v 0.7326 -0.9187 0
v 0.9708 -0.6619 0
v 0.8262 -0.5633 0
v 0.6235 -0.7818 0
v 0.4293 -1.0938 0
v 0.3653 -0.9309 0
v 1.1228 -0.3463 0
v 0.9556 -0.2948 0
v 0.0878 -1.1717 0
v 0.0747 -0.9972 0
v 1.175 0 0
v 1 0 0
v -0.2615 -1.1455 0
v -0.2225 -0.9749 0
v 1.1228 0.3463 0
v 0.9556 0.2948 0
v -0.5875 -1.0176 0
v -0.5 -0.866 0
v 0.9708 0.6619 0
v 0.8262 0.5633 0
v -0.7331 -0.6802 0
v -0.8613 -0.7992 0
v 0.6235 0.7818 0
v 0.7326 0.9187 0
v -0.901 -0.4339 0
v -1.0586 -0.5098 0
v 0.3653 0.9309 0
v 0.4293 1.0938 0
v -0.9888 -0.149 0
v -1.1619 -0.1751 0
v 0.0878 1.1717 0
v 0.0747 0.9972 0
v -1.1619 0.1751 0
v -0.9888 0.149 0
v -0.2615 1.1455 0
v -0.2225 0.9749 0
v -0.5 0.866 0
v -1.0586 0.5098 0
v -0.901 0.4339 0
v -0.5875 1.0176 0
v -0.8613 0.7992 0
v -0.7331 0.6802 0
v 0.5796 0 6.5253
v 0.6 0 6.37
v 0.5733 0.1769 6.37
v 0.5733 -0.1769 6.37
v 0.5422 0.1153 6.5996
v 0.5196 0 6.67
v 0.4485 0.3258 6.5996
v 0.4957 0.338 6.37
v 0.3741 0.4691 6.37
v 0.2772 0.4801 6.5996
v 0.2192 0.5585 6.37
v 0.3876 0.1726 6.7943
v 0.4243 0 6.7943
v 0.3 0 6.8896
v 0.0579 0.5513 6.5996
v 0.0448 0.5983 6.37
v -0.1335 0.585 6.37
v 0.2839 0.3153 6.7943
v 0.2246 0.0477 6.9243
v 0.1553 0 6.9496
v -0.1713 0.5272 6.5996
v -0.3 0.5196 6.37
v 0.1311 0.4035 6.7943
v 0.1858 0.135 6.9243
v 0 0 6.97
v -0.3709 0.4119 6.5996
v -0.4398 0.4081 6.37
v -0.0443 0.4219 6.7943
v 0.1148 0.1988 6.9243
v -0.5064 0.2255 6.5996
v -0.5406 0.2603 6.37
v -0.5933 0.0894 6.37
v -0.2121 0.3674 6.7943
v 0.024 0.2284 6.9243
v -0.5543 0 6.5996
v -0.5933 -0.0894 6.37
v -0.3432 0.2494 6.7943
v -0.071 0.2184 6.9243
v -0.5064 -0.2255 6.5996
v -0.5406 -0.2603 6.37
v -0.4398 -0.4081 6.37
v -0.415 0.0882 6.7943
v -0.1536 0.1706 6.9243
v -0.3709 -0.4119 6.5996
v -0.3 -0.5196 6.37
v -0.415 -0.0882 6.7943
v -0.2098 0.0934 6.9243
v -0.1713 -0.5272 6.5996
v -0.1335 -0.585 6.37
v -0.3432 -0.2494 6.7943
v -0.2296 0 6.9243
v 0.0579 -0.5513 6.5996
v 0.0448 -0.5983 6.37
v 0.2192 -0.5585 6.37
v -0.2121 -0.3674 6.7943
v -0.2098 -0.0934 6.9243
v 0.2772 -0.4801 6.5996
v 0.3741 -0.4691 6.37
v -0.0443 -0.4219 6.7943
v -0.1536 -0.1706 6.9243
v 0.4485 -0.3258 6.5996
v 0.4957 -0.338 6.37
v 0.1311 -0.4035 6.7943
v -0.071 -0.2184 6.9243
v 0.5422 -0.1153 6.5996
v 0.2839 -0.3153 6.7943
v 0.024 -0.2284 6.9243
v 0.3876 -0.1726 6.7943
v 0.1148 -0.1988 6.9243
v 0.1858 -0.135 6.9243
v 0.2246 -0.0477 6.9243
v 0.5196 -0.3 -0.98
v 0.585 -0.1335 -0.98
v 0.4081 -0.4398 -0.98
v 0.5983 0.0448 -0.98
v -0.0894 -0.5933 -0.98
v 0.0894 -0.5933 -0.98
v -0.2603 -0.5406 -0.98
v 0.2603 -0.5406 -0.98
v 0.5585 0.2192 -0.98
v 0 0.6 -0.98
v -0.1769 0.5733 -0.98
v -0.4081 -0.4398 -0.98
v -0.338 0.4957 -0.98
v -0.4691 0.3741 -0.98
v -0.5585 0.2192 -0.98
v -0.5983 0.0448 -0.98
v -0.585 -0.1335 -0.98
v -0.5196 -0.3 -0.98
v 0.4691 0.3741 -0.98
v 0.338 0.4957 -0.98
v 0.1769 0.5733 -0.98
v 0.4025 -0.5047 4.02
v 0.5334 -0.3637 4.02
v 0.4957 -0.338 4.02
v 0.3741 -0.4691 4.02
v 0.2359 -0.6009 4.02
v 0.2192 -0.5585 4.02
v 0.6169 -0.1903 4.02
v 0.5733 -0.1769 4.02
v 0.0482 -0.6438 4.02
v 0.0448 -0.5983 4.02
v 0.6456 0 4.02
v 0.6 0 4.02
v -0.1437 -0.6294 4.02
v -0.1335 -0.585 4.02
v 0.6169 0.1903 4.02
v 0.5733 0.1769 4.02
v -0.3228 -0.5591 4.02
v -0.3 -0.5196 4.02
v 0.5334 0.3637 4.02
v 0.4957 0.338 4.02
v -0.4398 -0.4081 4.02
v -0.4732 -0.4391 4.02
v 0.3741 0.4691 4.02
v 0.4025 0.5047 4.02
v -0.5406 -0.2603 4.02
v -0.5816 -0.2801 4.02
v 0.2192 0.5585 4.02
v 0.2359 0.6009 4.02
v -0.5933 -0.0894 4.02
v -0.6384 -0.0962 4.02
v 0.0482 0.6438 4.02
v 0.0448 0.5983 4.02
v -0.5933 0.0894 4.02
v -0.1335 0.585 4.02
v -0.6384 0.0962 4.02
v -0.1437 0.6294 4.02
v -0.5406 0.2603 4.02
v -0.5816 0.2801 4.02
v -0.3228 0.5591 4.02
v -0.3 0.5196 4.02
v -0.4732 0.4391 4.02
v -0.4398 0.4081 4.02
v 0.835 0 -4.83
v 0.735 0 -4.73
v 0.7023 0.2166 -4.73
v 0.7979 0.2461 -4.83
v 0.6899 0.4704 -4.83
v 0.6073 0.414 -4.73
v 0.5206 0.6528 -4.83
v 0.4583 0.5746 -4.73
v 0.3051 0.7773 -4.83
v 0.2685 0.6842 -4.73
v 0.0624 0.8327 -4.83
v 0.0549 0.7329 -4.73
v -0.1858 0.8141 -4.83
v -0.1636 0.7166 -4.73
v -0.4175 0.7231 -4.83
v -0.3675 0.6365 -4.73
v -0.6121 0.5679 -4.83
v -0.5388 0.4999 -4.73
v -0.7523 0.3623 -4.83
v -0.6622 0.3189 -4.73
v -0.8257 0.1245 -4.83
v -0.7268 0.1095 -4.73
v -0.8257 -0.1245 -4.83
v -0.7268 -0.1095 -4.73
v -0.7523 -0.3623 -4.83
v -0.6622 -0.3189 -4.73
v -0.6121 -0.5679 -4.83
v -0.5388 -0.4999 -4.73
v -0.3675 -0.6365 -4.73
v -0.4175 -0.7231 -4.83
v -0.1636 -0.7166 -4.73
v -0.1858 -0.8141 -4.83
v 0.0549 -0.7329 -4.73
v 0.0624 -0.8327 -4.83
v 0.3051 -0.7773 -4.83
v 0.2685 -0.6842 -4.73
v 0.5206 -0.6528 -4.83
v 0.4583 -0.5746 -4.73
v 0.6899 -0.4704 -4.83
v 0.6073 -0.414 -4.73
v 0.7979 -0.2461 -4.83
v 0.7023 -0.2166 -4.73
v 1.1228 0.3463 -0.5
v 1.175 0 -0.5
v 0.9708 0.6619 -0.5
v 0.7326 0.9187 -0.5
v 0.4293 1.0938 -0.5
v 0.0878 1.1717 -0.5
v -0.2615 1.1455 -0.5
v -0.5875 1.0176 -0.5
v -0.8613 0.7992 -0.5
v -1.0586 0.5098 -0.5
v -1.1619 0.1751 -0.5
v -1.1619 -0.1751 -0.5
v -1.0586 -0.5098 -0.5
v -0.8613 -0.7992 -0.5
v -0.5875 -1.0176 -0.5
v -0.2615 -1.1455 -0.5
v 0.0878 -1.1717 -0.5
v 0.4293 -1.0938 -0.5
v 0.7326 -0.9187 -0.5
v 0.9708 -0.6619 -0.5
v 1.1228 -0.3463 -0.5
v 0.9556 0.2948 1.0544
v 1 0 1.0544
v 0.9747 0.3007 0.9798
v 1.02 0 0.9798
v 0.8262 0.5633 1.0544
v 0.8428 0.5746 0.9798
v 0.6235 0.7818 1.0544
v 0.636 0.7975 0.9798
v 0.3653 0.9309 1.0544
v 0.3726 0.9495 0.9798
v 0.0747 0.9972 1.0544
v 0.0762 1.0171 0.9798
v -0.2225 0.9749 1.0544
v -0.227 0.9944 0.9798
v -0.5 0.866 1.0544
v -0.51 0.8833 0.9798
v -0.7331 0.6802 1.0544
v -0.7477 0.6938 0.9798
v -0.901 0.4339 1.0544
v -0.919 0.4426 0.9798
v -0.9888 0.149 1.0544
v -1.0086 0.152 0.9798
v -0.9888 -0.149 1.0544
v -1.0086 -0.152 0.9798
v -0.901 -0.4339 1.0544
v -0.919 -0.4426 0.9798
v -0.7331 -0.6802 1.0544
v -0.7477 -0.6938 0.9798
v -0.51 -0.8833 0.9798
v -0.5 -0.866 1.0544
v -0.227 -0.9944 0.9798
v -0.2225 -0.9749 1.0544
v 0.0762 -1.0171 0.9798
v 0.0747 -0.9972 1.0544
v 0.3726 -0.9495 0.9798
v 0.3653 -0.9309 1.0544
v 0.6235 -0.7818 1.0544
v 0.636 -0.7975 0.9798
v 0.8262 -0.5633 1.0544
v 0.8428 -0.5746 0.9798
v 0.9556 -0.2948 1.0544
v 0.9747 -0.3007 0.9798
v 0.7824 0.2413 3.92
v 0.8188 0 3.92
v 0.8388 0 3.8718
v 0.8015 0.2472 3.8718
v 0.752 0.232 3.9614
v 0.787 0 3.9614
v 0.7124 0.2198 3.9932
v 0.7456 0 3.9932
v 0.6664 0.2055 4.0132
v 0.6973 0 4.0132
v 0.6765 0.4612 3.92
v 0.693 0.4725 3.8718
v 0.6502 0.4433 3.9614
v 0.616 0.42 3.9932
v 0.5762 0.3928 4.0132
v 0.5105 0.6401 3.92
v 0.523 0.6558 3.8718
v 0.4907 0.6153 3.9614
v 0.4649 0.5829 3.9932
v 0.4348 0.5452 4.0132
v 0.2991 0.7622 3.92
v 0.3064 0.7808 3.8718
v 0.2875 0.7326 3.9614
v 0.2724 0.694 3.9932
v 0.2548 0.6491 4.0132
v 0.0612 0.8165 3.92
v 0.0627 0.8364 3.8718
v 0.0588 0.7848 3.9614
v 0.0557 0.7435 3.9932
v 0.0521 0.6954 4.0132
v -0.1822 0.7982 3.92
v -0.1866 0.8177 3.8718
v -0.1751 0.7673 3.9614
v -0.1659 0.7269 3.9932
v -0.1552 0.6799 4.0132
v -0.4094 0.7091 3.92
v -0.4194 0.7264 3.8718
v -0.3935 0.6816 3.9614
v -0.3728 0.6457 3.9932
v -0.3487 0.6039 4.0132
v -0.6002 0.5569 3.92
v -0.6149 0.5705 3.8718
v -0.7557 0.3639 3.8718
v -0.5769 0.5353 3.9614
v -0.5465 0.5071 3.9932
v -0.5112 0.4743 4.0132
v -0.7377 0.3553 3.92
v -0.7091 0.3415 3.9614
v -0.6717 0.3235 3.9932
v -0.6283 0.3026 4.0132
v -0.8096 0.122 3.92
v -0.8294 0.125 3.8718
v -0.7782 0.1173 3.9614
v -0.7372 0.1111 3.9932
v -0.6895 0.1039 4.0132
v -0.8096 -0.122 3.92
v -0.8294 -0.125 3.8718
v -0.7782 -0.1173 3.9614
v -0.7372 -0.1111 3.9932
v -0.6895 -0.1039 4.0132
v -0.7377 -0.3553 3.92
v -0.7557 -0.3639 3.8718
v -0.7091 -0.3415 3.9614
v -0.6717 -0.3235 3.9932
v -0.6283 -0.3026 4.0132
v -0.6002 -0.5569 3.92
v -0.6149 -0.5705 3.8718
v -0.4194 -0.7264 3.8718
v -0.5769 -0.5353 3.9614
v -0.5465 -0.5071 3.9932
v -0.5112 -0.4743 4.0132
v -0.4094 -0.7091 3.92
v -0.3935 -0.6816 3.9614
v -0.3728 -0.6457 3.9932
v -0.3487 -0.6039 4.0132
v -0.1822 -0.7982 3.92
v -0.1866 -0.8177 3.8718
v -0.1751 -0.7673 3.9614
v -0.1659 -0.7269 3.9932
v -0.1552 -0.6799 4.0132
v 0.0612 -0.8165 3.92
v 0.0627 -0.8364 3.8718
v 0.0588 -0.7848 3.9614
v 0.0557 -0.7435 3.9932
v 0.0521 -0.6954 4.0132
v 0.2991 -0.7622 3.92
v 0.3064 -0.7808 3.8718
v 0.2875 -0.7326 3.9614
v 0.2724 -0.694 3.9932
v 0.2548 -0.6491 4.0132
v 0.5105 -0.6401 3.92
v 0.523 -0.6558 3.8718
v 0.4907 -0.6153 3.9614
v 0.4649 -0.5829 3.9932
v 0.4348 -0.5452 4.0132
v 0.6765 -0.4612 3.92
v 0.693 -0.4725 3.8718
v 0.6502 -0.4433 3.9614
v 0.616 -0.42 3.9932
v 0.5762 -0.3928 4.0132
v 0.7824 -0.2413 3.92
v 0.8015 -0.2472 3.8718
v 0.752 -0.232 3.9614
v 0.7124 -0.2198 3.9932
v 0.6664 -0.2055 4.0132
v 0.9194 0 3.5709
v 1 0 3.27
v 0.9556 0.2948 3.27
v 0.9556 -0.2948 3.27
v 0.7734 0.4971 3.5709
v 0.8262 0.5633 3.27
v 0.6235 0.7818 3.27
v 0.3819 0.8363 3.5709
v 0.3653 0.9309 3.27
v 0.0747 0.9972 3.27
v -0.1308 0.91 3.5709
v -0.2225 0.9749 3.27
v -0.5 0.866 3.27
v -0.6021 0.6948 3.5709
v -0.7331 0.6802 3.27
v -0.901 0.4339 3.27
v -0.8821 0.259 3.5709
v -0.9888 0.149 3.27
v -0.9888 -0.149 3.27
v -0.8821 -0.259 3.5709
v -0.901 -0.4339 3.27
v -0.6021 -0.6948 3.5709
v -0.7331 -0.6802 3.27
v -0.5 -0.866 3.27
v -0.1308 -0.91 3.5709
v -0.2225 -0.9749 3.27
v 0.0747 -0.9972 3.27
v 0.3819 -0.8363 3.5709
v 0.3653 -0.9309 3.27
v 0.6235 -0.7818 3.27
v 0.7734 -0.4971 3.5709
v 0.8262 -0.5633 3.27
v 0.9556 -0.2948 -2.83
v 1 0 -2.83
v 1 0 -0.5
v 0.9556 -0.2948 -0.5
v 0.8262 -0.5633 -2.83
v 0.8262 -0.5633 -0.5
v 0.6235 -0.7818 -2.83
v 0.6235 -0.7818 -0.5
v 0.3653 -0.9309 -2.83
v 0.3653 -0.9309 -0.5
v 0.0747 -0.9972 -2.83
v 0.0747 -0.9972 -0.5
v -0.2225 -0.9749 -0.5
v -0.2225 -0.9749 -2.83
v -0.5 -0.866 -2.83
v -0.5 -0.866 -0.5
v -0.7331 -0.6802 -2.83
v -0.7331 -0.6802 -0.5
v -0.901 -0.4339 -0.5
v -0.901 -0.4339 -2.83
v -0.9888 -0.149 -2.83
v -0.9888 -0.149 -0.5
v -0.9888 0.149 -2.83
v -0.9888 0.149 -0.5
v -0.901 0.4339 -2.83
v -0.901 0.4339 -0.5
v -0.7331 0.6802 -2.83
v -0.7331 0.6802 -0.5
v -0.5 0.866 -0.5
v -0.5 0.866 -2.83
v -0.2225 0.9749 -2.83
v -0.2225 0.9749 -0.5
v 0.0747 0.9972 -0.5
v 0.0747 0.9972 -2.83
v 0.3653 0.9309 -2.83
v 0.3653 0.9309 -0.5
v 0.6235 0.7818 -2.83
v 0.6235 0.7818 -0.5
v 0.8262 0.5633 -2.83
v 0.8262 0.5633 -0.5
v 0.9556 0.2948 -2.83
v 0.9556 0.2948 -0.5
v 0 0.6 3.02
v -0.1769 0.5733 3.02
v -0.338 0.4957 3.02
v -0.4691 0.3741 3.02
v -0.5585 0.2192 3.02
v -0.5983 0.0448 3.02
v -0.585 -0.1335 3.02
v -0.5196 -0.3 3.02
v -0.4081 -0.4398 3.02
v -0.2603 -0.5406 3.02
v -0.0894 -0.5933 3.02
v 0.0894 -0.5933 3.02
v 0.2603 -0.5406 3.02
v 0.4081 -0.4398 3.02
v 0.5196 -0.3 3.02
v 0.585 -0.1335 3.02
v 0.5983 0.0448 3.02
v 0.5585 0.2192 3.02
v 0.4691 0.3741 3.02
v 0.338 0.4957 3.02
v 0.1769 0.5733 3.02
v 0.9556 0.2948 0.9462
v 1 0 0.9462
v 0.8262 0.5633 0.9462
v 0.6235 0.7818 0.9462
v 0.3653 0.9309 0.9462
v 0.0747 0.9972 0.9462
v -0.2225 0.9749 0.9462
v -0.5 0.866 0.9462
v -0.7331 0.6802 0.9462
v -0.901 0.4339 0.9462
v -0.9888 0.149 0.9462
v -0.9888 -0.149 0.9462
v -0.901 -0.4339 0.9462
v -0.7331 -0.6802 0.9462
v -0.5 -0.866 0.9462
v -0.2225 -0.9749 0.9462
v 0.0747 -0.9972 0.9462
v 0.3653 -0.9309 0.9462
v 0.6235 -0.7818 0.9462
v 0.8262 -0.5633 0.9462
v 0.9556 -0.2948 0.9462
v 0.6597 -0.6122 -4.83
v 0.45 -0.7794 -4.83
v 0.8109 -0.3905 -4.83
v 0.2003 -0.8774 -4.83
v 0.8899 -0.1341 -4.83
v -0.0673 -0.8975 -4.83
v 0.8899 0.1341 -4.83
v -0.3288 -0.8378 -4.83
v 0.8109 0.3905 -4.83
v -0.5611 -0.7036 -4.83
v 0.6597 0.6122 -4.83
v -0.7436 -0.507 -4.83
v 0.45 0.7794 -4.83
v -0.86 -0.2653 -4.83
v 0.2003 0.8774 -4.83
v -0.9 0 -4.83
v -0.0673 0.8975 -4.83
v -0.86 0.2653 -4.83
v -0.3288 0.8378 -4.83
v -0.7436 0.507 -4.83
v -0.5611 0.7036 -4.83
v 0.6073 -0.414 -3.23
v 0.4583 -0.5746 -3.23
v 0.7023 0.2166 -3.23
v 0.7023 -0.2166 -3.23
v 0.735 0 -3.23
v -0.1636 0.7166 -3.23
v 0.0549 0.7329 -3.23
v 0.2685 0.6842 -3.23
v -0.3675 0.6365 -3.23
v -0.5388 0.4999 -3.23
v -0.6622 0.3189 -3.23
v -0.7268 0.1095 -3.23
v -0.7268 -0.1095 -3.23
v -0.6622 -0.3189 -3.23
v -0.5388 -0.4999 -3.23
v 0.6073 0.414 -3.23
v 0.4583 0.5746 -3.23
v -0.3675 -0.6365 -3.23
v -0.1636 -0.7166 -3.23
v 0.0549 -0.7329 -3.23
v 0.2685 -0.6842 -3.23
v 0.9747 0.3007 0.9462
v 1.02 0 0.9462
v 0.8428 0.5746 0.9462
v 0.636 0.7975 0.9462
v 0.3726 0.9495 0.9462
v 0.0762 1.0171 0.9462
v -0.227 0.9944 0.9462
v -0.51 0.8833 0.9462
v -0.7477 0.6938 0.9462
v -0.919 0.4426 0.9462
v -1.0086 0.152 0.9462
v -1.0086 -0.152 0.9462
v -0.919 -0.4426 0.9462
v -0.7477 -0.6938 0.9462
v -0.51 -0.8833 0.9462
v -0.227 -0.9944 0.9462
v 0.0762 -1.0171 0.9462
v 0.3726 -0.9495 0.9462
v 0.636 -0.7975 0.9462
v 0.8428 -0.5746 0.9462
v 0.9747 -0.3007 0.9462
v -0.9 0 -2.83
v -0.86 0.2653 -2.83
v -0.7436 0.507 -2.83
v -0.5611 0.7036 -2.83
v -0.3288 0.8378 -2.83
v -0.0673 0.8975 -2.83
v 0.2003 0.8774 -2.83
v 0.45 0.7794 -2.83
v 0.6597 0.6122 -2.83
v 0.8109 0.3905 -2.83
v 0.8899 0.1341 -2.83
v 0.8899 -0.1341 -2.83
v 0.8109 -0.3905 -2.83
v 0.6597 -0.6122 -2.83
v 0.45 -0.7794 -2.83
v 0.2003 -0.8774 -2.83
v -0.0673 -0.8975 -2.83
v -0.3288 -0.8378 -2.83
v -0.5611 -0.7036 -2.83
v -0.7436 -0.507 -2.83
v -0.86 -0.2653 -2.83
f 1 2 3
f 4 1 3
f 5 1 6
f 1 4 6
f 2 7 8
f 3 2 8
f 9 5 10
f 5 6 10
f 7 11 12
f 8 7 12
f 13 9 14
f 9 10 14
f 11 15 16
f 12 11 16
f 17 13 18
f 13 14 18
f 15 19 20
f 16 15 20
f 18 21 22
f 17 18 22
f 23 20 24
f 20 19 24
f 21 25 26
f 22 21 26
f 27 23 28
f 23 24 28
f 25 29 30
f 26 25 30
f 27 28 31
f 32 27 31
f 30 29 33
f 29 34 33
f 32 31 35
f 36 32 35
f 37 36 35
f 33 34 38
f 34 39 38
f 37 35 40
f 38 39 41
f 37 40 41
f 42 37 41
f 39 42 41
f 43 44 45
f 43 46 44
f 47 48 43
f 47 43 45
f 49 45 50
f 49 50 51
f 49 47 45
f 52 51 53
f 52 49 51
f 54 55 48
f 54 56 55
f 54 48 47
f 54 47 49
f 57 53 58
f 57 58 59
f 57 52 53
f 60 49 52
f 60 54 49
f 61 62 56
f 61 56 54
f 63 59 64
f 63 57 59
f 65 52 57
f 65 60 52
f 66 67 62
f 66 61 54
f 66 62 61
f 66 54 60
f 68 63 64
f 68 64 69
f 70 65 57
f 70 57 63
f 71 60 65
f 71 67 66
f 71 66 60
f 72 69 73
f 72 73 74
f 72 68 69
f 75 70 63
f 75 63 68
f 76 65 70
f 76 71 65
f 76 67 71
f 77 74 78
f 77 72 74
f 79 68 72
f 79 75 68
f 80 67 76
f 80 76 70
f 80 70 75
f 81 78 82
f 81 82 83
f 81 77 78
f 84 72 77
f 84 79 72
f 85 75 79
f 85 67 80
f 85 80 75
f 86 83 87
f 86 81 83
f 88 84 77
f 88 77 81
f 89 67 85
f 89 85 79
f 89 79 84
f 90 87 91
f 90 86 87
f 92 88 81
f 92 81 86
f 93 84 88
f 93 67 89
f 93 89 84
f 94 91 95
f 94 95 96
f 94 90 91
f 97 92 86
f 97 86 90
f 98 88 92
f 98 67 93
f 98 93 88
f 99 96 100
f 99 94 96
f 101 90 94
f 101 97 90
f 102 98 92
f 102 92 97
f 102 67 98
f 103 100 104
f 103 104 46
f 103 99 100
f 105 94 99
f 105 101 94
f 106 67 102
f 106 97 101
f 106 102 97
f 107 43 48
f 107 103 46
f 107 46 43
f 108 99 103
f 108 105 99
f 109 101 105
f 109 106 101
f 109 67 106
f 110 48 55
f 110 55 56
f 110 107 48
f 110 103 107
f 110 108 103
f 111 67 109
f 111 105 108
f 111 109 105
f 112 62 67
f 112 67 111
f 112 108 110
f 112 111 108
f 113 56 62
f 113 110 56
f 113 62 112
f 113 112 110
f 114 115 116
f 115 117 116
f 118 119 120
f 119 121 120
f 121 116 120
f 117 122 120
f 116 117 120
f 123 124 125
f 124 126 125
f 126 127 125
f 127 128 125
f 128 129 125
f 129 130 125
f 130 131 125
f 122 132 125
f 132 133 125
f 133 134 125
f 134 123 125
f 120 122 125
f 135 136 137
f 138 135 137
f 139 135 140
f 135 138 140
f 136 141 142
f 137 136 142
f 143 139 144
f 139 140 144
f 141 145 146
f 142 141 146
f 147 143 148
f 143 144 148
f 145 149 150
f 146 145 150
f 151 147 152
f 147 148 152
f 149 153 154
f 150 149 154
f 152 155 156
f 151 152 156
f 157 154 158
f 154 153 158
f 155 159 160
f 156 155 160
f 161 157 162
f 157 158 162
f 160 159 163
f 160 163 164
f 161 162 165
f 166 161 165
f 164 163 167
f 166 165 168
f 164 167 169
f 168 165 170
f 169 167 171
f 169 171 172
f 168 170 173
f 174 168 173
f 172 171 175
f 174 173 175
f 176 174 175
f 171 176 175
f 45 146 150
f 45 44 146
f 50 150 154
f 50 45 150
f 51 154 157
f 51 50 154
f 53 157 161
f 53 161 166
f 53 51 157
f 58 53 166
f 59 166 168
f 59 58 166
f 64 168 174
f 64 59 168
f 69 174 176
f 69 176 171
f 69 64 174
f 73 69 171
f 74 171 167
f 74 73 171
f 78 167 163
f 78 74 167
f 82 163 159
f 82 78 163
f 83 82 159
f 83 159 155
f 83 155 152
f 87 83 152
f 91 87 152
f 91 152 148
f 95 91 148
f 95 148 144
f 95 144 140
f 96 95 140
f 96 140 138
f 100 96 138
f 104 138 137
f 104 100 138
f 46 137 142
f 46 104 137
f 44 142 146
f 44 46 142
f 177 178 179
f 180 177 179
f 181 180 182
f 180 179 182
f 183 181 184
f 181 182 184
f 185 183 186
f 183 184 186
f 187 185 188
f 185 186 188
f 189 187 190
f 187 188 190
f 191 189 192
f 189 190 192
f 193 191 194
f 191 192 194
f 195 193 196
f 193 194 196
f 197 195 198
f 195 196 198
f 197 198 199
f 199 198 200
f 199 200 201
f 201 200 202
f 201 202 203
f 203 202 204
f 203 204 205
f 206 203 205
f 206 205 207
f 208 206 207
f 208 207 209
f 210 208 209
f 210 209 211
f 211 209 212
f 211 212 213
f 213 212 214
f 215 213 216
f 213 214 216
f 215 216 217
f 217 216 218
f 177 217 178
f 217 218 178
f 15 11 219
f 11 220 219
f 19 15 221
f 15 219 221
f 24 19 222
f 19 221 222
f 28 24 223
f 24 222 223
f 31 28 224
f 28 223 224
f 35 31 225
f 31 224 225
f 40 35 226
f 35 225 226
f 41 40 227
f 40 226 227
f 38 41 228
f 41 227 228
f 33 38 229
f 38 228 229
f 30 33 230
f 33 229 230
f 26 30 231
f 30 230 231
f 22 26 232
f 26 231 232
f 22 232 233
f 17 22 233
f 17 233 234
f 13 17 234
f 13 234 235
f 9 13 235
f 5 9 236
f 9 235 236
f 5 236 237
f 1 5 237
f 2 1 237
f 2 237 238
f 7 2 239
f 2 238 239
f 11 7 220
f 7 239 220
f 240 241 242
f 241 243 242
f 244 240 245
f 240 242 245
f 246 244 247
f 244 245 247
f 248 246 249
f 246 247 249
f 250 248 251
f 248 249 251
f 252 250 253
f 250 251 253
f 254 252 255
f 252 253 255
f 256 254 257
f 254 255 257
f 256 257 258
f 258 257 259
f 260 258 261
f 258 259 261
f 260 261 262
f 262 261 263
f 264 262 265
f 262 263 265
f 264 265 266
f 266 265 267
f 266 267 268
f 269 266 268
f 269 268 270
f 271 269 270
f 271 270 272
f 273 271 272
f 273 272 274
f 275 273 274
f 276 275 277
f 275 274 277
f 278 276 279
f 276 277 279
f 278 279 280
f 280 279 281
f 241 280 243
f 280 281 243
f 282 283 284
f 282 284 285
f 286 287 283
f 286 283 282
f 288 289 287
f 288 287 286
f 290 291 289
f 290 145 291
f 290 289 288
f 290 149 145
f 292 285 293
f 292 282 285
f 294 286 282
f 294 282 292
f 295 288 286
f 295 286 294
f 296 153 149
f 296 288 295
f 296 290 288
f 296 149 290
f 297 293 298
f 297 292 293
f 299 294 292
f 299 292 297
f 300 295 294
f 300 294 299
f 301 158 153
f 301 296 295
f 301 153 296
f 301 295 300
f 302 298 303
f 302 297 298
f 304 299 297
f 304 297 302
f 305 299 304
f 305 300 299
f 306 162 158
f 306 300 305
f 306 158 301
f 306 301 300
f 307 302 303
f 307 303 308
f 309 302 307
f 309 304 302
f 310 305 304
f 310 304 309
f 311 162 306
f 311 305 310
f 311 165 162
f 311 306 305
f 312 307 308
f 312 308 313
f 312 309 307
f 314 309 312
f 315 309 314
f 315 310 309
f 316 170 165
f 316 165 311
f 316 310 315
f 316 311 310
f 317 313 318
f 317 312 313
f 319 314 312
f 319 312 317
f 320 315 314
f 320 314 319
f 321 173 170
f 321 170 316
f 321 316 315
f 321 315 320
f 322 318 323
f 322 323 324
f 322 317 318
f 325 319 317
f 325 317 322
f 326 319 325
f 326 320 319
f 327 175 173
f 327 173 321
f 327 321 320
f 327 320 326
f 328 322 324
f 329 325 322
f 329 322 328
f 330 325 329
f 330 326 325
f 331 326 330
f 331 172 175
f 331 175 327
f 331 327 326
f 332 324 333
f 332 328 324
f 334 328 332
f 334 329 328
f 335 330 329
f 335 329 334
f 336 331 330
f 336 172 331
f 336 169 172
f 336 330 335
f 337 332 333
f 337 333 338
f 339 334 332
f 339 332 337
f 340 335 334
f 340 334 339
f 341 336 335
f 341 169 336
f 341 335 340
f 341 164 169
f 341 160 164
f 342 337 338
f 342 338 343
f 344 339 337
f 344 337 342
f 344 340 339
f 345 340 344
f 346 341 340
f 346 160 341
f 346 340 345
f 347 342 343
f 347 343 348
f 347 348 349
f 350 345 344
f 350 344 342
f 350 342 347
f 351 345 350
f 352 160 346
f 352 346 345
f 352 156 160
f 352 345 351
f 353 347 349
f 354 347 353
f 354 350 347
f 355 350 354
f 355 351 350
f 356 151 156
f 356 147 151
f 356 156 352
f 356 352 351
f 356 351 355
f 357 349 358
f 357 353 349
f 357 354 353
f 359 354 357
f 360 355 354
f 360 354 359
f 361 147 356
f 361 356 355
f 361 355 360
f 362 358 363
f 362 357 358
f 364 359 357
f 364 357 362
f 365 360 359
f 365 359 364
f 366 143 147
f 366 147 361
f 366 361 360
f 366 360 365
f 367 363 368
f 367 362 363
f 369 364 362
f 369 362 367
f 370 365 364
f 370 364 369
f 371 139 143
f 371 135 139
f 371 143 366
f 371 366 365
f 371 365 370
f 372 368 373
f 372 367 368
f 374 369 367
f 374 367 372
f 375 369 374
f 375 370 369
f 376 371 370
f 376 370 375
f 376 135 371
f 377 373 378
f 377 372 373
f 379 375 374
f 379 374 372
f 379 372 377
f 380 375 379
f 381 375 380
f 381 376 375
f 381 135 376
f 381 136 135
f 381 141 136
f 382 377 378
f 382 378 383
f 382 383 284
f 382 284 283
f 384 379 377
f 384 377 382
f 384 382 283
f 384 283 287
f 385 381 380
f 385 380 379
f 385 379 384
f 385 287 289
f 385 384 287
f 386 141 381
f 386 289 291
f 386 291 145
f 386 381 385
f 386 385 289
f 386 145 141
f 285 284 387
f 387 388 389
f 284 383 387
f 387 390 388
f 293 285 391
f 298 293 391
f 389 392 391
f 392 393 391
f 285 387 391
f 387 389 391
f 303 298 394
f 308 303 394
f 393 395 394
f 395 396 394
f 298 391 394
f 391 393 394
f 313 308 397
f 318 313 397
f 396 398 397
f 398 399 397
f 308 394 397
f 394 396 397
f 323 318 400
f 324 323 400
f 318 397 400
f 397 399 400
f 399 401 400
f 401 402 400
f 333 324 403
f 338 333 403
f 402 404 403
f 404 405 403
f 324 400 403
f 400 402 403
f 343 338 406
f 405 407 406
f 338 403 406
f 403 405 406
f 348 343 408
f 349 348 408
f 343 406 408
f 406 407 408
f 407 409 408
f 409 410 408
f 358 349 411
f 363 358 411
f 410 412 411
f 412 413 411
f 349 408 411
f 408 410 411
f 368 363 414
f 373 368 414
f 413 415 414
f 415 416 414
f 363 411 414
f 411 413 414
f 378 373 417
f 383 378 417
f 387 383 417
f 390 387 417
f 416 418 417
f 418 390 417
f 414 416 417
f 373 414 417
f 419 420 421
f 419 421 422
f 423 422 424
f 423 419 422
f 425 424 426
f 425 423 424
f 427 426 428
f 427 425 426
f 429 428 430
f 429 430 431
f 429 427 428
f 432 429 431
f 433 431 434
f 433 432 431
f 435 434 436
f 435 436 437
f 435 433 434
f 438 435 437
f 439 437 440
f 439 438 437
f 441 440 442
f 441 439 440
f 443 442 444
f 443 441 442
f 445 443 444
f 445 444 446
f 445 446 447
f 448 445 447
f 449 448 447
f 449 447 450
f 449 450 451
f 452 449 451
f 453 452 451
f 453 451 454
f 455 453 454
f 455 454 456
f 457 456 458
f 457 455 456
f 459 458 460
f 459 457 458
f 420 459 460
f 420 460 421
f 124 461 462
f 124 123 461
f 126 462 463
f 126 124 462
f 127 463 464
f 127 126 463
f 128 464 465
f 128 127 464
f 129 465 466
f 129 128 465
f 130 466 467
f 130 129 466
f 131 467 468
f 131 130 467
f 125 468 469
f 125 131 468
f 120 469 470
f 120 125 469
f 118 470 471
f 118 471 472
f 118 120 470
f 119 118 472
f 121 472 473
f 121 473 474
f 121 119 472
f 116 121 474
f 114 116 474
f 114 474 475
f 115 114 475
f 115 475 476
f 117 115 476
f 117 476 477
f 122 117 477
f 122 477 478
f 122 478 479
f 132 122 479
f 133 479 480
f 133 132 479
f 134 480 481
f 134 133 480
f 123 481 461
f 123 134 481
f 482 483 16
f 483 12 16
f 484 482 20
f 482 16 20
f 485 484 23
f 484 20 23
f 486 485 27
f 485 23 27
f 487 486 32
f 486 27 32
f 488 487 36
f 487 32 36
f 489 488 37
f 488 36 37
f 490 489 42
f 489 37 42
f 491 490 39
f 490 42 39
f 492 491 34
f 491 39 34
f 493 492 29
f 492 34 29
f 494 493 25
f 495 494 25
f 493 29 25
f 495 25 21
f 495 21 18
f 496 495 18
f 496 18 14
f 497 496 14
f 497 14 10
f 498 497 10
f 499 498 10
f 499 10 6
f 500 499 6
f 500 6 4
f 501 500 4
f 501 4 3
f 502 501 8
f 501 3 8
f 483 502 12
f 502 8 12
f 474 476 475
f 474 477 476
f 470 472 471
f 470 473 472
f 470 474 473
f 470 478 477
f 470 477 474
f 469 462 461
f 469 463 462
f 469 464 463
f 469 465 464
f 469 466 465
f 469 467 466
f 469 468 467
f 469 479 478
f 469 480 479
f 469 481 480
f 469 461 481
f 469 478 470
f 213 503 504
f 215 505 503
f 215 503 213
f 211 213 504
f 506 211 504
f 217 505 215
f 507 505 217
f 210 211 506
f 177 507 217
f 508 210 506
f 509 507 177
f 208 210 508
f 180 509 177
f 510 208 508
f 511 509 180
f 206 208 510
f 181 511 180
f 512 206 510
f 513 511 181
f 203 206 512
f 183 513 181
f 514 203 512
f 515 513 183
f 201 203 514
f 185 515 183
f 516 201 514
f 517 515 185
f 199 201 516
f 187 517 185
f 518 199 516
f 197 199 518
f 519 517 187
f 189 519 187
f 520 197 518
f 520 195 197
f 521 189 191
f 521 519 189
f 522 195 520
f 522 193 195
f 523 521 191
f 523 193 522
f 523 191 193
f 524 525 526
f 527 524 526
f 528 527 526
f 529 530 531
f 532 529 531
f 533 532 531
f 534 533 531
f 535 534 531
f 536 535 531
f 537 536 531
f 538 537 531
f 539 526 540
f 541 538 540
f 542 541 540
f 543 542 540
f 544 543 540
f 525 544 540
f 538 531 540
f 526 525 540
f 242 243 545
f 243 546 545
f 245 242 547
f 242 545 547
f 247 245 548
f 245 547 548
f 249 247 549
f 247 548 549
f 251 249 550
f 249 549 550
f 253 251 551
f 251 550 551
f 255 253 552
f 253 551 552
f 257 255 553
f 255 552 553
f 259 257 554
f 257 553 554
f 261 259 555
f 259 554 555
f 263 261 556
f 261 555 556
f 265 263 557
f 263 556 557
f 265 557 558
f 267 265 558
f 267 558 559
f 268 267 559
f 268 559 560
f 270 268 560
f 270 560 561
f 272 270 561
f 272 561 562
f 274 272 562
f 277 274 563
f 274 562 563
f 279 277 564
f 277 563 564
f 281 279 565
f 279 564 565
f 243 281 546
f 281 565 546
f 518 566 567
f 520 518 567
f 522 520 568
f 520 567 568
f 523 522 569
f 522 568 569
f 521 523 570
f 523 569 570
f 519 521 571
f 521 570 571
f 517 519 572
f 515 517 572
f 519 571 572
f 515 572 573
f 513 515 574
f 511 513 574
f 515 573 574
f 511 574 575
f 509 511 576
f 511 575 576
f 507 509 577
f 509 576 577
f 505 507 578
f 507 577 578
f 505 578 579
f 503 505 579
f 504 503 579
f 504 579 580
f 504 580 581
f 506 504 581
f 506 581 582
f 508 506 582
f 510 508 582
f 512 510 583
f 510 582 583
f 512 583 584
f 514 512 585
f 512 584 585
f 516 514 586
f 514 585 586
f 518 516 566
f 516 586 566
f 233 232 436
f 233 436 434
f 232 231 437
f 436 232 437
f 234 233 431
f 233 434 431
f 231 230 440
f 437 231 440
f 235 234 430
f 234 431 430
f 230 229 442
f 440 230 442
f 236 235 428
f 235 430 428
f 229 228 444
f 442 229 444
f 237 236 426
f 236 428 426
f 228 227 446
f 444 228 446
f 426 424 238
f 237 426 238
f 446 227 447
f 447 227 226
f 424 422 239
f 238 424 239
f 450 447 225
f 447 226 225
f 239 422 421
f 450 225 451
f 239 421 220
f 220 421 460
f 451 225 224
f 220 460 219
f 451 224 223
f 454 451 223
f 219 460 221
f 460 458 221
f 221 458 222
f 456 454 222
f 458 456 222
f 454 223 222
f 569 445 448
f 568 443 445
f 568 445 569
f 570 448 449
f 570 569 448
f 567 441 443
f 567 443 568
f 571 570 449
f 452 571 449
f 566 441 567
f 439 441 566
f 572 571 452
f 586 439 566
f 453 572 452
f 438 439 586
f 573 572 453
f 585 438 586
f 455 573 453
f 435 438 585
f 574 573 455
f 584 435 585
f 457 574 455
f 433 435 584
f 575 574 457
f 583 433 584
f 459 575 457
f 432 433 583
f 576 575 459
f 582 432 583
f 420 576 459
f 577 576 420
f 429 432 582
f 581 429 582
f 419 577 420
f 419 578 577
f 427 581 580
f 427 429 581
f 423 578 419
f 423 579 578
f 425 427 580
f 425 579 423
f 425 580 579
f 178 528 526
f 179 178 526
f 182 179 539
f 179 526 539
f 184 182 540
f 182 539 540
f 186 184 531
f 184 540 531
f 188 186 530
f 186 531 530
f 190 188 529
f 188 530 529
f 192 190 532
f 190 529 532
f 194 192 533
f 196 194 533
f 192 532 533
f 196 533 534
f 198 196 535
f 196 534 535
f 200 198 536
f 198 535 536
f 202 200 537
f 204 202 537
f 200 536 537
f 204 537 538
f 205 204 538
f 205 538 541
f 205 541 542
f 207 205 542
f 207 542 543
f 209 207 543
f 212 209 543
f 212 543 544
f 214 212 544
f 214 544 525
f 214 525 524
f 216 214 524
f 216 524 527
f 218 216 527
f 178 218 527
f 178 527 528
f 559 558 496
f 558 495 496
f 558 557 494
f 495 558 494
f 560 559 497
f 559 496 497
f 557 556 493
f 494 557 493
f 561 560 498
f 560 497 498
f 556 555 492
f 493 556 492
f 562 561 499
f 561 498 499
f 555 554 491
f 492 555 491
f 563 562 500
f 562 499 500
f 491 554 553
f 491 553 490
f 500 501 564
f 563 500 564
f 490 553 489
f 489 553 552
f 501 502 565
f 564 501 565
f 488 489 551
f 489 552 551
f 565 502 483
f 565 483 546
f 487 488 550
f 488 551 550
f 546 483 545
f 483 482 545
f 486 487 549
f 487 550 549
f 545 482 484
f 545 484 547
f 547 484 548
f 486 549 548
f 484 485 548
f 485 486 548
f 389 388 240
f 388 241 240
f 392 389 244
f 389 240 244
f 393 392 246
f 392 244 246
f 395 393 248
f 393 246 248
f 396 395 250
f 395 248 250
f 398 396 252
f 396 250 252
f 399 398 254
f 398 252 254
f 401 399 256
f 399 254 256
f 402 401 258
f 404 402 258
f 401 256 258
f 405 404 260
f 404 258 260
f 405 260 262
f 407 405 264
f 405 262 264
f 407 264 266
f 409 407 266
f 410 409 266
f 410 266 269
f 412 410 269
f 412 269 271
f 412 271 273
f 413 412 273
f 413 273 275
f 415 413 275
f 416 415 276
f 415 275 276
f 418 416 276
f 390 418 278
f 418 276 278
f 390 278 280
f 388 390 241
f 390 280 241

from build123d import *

# Parameters (mm, degrees)
BOSS_EXTRU_2_START = 2.33
ESQUISSE3_R        = 1
BOSS_EXTRU_2_DEPTH = 2.33
ESQUISSE4_R        = 0.9
BOSS_EXTRU_3_DEPTH = 2
ESQUISSE5_W        = 0.6
ESQUISSE5_H        = 4
PER_AGE1_D         = 1.47
PER_AGE1_DEPTH     = 1.6
CHANFREIN1_SIZE    = 0.1
CONG_1_R           = 0.2


# Read off the part's stored shape, not the designer's step: Boss.-Extru.1
with BuildPart() as part:
    # Esquisse1 → Révolution1 (revolve)
    with BuildSketch(Plane(origin=(0, 0, 0), x_dir=(1, 0, 0), z_dir=(0, 1, 0))):
        Polygon((1.175, 0.5), (0, 0.5), (0, -4.02), (0.799038106, -4.02), (1, -3.27), (1, -1.054421399), (1.02, -0.979780383), (1.02, -0.946167323), (1, -0.946167323), (1, 0), (1.175, 0), align=None)
    revolve(axis=Axis((0, 0, -0.5), (0, 0, 1)))

    # Boss.-Extru.1 outline → Boss.-Extru.1 (revolve)
    with BuildSketch(Plane.XZ):
        with BuildLine():
            Line((0.6, 4.02), (0.6, 6.37))
            ThreePointArc((0.6, 6.37), (0.424264069, 6.794264069), (0, 6.97))
            Line((0, 6.97), (0, 4.02))
            Line((0, 4.02), (0.6, 4.02))
        make_face()
    revolve(axis=Axis((0, 0, 0), (0, 0, 1)))

    # Esquisse3 → Boss.-Extru.2 (add)
    with BuildSketch(Plane(origin=(0, 0, -0.5), x_dir=(-1, 0, 0), z_dir=(0, 0, -1)).offset(BOSS_EXTRU_2_START)):
        with Locations(Location((0, 0, 0), (0, 0, 180))):
            Circle(ESQUISSE3_R)
    extrude(amount=-BOSS_EXTRU_2_DEPTH)

    # Esquisse4 → Boss.-Extru.3 (add)
    with BuildSketch(Plane(origin=(0, 0, -2.83), x_dir=(-1, 0, 0), z_dir=(0, 0, -1))):
        Circle(ESQUISSE4_R)
    extrude(amount=BOSS_EXTRU_3_DEPTH)

    # Esquisse5 → Enlèvement de matière-Révolution1 (revolve, cut)
    with BuildSketch(Plane(origin=(0, 0, 0), x_dir=(1, 0, 0), z_dir=(0, 1, 0)), mode=Mode.PRIVATE) as enl_vement_de_mati_re_r_volution1_sk:
        with Locations((0.3, -1.02)):
            Rectangle(ESQUISSE5_W, ESQUISSE5_H)
    revolve(enl_vement_de_mati_re_r_volution1_sk.sketch.rotate(Axis((0, 0, -0.98), (0, 0, 1)), 90), axis=Axis((0, 0, -0.98), (0, 0, 1)), mode=Mode.SUBTRACT)

    # Perçage1
    with Locations(Plane(origin=(0, 0, -4.83), x_dir=(-1, 0, 0), z_dir=(0, 0, -1))):
        with Locations((0, 0)):
            Hole(PER_AGE1_D / 2, depth=PER_AGE1_DEPTH)

    # Chanfrein1
    chanfrein1_edges = [part.edges().sort_by_distance(p)[0] for p in [
        (-0.735, 0, -4.83),
    ]]
    chamfer(chanfrein1_edges, length=CHANFREIN1_SIZE)

    # Congé1
    cong_1_edges = [part.edges().sort_by_distance(p)[0] for p in [
        (-0.799038106, 0, 4.02),
    ]]
    fillet(cong_1_edges, radius=CONG_1_R)


solid = part.part
